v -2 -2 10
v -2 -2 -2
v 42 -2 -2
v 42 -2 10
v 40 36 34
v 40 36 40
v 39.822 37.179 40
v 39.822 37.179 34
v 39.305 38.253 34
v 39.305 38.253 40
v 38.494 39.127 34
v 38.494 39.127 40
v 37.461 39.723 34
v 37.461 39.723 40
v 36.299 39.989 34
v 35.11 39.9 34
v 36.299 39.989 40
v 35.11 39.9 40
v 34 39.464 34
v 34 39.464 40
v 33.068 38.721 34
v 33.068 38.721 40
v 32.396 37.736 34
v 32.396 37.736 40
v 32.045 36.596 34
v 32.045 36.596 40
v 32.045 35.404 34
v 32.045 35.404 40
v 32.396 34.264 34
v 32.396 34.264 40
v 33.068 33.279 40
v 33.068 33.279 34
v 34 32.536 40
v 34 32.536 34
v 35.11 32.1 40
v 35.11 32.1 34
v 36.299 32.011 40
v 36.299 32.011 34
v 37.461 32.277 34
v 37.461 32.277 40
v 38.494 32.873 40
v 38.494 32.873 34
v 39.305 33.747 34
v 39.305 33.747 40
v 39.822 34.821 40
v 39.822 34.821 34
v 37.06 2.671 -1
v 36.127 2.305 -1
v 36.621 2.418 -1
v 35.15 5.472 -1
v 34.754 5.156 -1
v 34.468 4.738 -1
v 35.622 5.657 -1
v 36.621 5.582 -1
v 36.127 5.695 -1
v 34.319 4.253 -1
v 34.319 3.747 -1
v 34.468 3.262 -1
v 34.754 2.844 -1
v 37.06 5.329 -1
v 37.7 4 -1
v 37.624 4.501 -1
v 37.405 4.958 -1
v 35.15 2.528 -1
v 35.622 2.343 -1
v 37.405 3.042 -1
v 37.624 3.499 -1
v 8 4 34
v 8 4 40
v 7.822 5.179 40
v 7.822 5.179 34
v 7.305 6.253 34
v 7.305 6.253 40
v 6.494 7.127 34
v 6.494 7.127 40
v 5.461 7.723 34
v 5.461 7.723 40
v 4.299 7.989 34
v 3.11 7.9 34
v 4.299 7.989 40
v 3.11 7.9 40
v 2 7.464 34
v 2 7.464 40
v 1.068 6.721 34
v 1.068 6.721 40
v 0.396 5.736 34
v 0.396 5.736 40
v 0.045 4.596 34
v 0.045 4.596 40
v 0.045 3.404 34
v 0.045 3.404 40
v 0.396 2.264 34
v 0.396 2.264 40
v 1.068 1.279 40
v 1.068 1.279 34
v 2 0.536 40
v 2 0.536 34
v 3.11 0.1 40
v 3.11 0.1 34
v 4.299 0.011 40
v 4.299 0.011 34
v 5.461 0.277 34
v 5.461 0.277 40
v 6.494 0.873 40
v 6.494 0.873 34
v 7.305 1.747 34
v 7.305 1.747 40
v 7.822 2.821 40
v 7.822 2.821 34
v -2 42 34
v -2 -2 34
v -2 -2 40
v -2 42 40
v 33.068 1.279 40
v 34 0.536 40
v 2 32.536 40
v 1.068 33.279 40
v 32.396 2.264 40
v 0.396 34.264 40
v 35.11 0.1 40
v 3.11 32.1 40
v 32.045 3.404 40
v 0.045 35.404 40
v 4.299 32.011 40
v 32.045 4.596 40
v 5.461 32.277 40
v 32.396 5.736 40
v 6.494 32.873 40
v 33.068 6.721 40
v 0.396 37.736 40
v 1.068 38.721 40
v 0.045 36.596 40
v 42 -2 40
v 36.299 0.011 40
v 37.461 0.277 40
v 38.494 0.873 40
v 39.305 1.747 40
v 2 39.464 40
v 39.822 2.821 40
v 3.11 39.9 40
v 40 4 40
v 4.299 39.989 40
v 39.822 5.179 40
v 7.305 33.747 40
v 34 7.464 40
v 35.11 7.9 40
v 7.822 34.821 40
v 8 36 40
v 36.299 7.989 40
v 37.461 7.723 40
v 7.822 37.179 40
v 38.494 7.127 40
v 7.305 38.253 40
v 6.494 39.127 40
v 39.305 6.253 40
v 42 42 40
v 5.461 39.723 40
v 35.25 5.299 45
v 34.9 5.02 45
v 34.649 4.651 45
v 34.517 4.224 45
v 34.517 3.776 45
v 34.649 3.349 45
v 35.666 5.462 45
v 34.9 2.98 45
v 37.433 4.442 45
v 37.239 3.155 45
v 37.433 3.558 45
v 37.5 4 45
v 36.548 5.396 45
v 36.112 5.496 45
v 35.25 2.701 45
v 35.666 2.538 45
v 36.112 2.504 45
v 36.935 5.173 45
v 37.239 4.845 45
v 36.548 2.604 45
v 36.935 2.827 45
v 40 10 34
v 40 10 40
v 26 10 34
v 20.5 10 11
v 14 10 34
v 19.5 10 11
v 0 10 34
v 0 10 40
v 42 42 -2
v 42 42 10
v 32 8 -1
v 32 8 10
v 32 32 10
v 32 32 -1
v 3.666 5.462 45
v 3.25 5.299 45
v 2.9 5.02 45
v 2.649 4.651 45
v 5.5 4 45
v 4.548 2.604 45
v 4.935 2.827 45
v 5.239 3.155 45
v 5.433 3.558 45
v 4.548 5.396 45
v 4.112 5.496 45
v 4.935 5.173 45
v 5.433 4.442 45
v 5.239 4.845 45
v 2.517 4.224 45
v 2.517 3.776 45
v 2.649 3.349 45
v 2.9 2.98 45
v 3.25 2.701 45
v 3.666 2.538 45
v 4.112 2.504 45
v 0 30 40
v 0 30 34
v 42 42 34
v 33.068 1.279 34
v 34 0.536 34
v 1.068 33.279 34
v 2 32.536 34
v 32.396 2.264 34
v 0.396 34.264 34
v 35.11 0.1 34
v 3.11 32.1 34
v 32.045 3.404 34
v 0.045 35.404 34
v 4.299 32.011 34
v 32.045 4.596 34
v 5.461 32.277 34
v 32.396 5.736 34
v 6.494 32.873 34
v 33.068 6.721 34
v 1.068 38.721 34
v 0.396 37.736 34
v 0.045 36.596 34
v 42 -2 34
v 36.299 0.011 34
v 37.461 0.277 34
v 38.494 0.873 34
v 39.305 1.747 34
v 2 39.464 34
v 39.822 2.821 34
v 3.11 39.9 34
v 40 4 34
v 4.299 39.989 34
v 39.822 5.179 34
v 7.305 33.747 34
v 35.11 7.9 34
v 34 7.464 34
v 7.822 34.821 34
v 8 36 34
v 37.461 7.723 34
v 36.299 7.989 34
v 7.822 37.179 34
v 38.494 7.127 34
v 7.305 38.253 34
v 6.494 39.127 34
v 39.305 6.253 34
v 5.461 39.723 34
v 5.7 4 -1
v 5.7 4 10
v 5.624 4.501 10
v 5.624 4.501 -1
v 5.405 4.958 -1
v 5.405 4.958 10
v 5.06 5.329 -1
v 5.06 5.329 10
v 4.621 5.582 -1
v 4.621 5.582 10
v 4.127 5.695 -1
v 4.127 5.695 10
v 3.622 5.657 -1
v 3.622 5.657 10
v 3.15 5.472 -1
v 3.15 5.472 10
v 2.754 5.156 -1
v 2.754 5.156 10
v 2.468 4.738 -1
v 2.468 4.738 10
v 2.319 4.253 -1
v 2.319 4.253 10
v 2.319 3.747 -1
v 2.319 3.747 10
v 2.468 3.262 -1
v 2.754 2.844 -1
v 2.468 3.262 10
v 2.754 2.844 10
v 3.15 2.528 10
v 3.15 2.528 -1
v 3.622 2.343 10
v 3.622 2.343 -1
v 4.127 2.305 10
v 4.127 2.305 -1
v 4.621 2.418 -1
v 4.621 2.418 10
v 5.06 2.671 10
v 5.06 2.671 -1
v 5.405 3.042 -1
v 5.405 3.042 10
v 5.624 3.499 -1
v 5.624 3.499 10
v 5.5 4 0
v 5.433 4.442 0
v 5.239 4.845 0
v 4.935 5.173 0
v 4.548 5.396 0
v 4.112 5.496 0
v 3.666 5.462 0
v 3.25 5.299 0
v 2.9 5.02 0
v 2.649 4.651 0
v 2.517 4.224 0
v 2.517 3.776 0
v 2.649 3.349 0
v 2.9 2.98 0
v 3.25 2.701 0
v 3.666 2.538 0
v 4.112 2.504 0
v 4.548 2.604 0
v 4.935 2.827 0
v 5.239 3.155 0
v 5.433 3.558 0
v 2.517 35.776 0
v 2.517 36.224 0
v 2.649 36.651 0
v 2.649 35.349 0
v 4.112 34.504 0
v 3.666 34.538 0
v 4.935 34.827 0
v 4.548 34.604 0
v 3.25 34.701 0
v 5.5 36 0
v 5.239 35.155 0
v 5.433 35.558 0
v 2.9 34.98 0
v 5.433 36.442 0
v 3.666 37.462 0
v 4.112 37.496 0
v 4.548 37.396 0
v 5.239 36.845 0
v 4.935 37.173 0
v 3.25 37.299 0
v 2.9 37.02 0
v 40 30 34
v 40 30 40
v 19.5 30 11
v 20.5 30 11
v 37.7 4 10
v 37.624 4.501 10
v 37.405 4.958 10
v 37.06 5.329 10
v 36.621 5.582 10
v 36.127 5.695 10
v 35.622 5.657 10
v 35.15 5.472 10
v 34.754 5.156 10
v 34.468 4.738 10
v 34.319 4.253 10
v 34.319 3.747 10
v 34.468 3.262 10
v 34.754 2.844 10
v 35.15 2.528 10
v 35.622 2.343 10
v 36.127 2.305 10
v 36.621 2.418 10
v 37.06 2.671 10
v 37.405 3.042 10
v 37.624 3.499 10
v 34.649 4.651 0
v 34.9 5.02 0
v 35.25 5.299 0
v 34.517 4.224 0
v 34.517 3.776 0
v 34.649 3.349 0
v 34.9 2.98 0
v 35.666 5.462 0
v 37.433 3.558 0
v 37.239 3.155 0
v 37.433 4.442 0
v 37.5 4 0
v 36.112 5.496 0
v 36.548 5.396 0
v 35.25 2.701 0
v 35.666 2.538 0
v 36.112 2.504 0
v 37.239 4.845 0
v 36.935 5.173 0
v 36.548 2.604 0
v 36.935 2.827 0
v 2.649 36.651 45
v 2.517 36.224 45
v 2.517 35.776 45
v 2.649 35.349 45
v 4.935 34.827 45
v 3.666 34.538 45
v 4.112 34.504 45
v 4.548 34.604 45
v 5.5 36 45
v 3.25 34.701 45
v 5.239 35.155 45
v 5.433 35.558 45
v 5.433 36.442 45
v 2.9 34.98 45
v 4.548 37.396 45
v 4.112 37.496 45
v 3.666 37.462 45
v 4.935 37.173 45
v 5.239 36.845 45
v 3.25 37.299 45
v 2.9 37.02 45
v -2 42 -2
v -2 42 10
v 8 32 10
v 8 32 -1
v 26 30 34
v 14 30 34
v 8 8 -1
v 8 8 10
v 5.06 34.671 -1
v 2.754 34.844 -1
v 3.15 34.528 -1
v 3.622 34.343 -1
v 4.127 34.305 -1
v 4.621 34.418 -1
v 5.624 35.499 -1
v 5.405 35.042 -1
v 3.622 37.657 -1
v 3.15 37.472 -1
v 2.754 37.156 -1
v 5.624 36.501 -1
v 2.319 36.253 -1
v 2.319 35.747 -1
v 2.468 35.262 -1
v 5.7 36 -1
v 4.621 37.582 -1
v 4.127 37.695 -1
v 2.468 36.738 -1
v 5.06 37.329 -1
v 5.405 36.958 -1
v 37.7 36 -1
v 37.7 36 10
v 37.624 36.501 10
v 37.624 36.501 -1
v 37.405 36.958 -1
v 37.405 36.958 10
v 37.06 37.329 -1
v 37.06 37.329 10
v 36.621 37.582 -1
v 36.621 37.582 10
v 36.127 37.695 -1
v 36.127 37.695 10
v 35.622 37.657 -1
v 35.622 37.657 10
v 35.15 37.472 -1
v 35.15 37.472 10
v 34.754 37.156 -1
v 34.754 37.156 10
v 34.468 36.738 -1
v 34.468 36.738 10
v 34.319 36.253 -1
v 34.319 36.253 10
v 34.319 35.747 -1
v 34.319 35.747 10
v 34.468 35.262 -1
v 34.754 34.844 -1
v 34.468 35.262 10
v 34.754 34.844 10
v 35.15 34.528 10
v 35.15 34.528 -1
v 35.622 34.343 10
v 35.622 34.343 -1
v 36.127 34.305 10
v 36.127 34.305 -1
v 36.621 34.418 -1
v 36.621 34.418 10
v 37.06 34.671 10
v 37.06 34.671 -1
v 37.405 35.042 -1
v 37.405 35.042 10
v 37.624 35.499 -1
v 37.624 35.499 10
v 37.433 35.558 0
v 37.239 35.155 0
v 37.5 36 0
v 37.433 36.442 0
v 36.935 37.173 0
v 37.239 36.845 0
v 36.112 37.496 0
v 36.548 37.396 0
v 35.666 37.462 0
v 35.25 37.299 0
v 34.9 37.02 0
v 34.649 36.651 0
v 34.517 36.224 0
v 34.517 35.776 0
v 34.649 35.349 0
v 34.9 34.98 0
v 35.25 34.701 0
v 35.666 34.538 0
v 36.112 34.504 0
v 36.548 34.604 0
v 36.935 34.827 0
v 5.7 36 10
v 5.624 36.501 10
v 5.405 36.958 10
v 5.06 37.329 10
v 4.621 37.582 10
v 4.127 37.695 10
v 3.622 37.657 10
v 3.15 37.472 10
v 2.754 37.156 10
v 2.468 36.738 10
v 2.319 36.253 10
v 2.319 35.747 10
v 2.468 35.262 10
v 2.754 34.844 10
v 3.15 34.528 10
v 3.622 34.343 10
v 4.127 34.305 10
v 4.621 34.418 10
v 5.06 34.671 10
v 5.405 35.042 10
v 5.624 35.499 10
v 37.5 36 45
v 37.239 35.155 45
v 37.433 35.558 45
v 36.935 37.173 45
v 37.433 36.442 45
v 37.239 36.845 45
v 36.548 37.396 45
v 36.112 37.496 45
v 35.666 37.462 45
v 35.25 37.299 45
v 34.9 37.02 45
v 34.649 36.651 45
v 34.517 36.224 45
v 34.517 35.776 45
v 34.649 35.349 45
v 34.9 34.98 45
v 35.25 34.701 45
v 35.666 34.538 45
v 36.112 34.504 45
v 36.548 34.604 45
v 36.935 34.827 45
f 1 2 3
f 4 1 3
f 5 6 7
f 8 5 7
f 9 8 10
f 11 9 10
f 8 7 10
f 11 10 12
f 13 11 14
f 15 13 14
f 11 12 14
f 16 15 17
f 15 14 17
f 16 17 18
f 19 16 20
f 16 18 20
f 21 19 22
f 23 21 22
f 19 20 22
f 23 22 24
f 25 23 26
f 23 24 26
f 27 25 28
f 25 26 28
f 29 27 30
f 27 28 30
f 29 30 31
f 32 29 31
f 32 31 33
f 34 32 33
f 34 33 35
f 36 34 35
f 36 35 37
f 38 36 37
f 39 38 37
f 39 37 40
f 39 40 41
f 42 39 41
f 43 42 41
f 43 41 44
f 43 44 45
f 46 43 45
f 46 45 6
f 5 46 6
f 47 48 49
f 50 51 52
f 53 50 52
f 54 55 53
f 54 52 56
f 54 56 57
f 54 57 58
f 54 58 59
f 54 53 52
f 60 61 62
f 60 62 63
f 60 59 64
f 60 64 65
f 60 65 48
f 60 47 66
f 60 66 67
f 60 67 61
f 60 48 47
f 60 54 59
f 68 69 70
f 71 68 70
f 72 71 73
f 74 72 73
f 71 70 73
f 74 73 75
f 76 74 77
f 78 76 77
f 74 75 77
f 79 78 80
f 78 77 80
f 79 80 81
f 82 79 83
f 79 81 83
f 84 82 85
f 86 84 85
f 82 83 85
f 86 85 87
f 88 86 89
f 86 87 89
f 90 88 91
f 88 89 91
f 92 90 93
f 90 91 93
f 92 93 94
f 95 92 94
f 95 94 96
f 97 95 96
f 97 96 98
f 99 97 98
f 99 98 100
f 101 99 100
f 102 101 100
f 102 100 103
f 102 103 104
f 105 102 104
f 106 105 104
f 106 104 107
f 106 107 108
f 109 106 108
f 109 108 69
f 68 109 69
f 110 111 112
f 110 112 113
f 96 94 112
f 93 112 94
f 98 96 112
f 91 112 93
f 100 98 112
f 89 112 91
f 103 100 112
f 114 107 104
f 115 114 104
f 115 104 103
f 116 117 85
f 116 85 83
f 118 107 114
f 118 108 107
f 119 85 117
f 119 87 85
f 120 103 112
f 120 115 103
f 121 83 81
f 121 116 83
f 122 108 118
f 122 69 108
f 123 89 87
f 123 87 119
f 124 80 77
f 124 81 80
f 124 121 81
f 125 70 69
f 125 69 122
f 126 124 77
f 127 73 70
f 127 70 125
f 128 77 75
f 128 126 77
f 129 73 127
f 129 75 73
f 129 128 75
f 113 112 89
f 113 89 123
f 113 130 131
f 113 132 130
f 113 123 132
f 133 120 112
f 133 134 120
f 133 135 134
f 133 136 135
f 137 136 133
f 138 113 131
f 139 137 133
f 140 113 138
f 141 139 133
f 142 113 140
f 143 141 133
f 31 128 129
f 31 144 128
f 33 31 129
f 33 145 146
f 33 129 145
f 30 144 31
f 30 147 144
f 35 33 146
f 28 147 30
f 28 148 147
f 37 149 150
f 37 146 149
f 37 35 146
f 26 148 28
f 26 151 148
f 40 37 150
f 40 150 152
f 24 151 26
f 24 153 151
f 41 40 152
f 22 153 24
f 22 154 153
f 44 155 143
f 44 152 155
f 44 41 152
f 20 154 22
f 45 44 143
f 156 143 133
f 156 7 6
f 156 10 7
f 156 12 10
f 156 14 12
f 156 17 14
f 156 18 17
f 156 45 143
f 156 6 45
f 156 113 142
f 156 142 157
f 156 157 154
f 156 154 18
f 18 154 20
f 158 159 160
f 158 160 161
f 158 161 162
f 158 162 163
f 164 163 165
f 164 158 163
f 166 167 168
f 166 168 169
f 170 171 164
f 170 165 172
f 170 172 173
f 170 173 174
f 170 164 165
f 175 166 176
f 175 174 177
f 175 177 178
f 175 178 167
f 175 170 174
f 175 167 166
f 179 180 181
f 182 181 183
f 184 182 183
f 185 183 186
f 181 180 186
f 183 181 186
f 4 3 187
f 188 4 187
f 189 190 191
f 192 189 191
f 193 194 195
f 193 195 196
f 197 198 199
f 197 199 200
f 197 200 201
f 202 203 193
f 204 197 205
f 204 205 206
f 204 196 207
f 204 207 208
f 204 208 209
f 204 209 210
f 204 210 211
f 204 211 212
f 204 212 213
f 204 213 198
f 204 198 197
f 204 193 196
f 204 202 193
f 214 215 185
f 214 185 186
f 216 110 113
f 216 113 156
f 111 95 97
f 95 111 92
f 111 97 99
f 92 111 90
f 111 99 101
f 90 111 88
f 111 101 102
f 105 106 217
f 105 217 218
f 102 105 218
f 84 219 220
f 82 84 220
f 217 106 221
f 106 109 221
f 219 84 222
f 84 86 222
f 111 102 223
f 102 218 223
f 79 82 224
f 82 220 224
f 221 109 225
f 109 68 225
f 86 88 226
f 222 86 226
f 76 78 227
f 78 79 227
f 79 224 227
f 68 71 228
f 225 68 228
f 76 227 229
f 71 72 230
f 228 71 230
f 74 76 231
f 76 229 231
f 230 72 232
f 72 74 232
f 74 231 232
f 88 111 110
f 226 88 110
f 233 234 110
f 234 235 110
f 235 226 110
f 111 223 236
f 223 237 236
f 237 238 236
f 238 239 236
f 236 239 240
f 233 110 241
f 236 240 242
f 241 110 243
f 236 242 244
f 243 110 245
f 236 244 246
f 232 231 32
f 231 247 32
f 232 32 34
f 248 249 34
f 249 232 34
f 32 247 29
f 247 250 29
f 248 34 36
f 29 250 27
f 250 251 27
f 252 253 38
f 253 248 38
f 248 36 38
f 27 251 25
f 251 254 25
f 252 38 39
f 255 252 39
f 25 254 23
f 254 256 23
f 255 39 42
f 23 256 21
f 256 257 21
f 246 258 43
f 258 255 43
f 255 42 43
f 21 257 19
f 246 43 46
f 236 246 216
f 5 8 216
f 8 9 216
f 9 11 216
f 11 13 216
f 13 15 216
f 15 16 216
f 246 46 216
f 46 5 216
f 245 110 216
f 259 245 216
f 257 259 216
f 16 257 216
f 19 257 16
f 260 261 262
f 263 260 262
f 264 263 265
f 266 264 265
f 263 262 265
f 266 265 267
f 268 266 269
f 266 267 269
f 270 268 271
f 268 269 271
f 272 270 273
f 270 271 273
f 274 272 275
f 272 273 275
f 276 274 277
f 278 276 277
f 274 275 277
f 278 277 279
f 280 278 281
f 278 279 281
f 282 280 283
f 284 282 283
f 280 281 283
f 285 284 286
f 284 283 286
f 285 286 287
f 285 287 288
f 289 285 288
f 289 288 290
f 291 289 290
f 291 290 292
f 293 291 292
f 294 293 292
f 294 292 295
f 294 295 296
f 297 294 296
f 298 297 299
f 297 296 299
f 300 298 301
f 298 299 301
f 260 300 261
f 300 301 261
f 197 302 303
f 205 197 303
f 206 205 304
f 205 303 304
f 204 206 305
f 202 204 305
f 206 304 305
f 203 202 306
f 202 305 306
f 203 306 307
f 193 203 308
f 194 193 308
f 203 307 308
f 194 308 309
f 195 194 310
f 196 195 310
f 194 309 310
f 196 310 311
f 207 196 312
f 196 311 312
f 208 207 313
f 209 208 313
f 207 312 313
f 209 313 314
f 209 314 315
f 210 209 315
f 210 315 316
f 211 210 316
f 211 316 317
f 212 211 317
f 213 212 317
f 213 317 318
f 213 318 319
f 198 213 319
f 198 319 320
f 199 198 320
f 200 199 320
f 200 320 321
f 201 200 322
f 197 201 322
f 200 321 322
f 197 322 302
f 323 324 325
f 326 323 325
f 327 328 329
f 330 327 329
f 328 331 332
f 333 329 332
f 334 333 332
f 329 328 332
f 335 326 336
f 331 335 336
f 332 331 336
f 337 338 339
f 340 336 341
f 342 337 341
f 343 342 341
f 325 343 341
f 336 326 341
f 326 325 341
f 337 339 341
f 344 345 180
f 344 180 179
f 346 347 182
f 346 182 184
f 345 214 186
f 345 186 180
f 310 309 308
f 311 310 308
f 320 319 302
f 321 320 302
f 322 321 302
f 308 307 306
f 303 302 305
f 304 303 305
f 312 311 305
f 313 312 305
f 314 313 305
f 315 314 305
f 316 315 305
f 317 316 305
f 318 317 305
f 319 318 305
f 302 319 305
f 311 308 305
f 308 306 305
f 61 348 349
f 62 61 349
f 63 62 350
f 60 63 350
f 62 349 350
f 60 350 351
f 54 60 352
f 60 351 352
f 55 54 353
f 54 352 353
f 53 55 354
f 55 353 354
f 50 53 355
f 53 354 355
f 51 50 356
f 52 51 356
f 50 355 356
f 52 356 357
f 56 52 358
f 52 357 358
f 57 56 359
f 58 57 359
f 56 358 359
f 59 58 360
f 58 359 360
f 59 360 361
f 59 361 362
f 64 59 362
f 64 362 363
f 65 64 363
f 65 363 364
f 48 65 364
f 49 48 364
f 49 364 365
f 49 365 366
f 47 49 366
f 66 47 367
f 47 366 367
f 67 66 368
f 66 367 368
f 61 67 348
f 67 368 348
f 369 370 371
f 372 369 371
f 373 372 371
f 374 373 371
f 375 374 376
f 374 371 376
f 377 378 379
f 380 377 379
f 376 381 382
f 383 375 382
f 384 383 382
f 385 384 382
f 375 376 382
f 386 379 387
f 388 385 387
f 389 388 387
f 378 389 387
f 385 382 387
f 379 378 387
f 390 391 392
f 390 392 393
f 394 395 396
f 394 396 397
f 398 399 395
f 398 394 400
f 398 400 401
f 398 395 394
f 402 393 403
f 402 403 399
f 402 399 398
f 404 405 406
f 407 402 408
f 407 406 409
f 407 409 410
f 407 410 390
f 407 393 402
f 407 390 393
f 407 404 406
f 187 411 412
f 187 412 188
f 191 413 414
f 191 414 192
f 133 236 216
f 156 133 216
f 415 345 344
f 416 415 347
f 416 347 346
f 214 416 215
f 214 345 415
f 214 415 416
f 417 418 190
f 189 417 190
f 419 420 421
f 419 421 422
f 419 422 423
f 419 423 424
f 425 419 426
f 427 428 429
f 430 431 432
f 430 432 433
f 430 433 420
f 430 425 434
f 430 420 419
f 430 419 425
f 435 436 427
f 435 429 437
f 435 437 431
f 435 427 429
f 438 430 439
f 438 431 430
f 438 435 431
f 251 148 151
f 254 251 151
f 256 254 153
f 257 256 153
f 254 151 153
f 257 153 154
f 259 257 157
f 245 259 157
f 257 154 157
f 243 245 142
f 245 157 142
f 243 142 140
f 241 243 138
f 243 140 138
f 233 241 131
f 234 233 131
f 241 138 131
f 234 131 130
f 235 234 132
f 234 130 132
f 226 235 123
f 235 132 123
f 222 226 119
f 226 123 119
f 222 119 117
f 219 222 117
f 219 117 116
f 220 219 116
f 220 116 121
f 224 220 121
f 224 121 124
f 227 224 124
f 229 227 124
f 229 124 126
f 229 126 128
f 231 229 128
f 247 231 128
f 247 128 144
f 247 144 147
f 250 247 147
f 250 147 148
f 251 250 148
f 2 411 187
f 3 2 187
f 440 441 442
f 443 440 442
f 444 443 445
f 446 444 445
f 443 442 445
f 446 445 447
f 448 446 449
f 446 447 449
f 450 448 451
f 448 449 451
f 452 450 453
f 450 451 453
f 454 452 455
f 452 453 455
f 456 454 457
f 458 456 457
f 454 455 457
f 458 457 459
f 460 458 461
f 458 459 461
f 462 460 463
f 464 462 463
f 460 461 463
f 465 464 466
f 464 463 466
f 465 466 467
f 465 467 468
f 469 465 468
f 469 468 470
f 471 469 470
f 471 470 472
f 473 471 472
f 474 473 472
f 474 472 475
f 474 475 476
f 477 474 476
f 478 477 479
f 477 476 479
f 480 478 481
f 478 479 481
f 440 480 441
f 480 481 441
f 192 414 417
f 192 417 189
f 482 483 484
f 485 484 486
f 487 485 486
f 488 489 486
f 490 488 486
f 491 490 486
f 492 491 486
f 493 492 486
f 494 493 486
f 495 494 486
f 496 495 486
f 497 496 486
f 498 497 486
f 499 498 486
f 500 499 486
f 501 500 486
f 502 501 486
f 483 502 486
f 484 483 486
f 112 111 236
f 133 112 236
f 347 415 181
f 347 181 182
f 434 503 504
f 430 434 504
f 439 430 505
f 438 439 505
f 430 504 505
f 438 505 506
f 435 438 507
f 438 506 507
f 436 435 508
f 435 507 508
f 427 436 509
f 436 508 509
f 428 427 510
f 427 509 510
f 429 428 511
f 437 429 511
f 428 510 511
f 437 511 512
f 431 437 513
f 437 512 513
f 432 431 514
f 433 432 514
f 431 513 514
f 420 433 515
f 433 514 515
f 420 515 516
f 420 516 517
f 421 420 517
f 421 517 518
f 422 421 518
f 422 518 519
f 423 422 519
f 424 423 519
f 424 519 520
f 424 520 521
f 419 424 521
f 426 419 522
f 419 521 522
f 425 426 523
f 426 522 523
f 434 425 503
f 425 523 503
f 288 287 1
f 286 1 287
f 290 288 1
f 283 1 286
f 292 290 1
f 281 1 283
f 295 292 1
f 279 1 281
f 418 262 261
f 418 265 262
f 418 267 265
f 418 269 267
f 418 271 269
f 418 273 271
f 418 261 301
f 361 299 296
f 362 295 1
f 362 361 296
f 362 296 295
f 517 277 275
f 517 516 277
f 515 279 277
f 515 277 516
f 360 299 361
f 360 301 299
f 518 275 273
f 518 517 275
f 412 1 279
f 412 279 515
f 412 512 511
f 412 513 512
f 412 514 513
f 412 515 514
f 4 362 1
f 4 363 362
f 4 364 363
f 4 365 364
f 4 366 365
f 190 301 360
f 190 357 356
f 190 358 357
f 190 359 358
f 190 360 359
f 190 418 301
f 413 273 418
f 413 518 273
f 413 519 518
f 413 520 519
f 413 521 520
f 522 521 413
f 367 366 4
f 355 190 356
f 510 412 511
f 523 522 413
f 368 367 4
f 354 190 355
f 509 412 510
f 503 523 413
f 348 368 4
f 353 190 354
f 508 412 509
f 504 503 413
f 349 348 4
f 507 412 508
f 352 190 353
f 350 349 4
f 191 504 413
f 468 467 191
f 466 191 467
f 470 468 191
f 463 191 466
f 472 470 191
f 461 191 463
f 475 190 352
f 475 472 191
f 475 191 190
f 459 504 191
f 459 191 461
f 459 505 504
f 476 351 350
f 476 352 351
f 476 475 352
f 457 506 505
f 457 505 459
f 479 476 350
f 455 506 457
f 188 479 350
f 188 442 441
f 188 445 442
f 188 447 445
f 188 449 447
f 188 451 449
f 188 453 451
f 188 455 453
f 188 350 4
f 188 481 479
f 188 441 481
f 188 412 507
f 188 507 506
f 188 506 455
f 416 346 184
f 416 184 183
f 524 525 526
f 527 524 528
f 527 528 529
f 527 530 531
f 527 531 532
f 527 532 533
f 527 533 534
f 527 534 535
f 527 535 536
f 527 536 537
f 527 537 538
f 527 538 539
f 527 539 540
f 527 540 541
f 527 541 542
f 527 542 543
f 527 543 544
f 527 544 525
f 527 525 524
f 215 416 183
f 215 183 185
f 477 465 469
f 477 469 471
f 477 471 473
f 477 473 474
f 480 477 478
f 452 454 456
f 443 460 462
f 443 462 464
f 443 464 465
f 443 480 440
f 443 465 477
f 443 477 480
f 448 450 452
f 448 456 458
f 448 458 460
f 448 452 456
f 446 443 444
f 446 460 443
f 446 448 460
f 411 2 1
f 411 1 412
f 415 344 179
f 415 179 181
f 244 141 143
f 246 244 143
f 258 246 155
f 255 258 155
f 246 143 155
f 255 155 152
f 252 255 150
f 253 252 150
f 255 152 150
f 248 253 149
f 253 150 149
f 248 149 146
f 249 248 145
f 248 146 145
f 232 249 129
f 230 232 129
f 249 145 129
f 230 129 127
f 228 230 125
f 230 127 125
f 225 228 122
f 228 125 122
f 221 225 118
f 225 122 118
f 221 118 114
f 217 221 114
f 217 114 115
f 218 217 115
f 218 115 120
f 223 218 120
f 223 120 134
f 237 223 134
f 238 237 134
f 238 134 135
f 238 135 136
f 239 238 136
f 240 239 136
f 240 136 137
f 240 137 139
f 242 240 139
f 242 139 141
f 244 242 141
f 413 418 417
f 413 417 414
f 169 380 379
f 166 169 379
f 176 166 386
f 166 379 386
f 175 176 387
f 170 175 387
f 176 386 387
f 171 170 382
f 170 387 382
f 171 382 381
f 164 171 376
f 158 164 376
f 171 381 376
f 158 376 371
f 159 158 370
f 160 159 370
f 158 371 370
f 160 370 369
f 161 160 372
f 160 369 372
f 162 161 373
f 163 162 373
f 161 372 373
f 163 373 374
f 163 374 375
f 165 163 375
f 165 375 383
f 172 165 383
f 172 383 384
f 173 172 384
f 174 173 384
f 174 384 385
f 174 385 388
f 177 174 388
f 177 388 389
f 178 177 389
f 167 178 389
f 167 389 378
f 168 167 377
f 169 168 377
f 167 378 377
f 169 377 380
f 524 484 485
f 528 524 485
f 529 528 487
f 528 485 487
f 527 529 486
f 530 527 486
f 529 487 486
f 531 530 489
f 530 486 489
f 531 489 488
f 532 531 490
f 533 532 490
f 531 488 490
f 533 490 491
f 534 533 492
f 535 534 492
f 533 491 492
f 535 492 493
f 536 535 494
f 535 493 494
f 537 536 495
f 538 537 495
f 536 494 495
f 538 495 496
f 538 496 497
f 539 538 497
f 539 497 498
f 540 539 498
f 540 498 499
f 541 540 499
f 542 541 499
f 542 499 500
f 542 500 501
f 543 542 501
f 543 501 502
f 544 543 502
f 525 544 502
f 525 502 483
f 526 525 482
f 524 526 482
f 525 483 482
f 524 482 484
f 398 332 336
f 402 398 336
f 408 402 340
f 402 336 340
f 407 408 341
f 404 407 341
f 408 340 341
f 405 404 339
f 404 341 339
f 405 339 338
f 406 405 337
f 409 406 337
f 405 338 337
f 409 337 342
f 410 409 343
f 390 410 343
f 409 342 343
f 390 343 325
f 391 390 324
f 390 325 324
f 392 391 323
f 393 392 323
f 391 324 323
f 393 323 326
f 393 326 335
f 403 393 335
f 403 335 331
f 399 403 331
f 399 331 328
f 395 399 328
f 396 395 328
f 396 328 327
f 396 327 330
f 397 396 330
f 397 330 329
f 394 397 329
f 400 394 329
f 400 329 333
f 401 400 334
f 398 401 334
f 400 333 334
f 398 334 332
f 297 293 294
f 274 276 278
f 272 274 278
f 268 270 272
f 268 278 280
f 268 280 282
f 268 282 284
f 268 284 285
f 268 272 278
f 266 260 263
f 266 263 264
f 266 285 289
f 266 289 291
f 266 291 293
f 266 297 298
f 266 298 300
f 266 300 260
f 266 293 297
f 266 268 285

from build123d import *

# Parameters (mm, degrees)
BOX_W             = 44
BOX_H             = 44
BOX_DEPTH         = 12
SKETCH_R          = 1.7
SKETCH_W          = 24
SKETCH_H          = 24
POCKET_DEPTH      = 11
PAD_DEPTH         = 20
BOX001_W          = 44
BOX001_H          = 44
BOX001_DEPTH      = 6
SKETCH002_R       = 4
POCKET001_DEPTH   = 7
CYLINDER_R        = 1.5
CYLINDER_DEPTH    = 45
CYLINDER001_R     = 1.5
CYLINDER001_DEPTH = 45
CYLINDER002_R     = 1.5
CYLINDER002_DEPTH = 45
CYLINDER003_R     = 1.5
CYLINDER003_DEPTH = 45


with BuildPart() as pocket:
    # Box → Box (new body)
    with BuildSketch(Plane(origin=(-2, -2, -2), x_dir=(1, 0, 0), z_dir=(0, 0, 1))):
        with Locations((22, 22)):
            Rectangle(BOX_W, BOX_H)
    extrude(amount=BOX_DEPTH)

    # Sketch (on Face6 of Box) → Pocket (cut)
    with BuildSketch(Plane(origin=(-2, -2, 10), x_dir=(1, 0, 0), z_dir=(0, 0, 1))):
        with Locations((6, 38)):
            Circle(SKETCH_R)
        with Locations((38, 38)):
            Circle(SKETCH_R)
        with Locations((38, 6)):
            Circle(SKETCH_R)
        with Locations((6, 6)):
            Circle(SKETCH_R)
        with Locations((22, 22)):
            Rectangle(SKETCH_W, SKETCH_H)
    extrude(amount=-POCKET_DEPTH, mode=Mode.SUBTRACT)


with BuildPart() as pad:
    # Sketch001 → Pad (new body)
    with BuildSketch(Plane.XZ.offset(-30)):
        Polygon((0, 40), (40, 40), (40, 34), (26, 34), (20.5, 11), (19.5, 11), (14, 34), (0, 34), align=None)
    extrude(amount=PAD_DEPTH)


with BuildPart() as pocket001:
    # Box001 → Box001 (new body)
    with BuildSketch(Plane(origin=(-2, -2, 34), x_dir=(1, 0, 0), z_dir=(0, 0, 1))):
        with Locations((22, 22)):
            Rectangle(BOX001_W, BOX001_H)
    extrude(amount=BOX001_DEPTH)

    # Sketch002 (on Face6 of Box001) → Pocket001 (cut)
    with BuildSketch(Plane(origin=(-2, -2, 40), x_dir=(1, 0, 0), z_dir=(0, 0, 1))):
        with Locations((6, 38)):
            Circle(SKETCH002_R)
        with Locations((38, 38)):
            Circle(SKETCH002_R)
        with Locations((6, 6)):
            Circle(SKETCH002_R)
        with Locations((38, 6)):
            Circle(SKETCH002_R)
    extrude(amount=-POCKET001_DEPTH, mode=Mode.SUBTRACT)


with BuildPart() as cylinder:
    # Cylinder → Cylinder (new body)
    with BuildSketch(Plane(origin=(4, 4, 0), x_dir=(1, 0, 0), z_dir=(0, 0, 1))):
        Circle(CYLINDER_R)
    extrude(amount=CYLINDER_DEPTH)


with BuildPart() as cylinder001:
    # Cylinder001 → Cylinder001 (new body)
    with BuildSketch(Plane(origin=(4, 36, 0), x_dir=(1, 0, 0), z_dir=(0, 0, 1))):
        Circle(CYLINDER001_R)
    extrude(amount=CYLINDER001_DEPTH)


with BuildPart() as cylinder002:
    # Cylinder002 → Cylinder002 (new body)
    with BuildSketch(Plane(origin=(36, 36, 0), x_dir=(1, 0, 0), z_dir=(0, 0, 1))):
        Circle(CYLINDER002_R)
    extrude(amount=CYLINDER002_DEPTH)


with BuildPart() as cylinder003:
    # Cylinder003 → Cylinder003 (new body)
    with BuildSketch(Plane(origin=(36, 4, 0), x_dir=(1, 0, 0), z_dir=(0, 0, 1))):
        Circle(CYLINDER003_R)
    extrude(amount=CYLINDER003_DEPTH)


solid = Compound([pocket.part, pad.part, pocket001.part, cylinder.part, cylinder001.part, cylinder002.part, cylinder003.part])
